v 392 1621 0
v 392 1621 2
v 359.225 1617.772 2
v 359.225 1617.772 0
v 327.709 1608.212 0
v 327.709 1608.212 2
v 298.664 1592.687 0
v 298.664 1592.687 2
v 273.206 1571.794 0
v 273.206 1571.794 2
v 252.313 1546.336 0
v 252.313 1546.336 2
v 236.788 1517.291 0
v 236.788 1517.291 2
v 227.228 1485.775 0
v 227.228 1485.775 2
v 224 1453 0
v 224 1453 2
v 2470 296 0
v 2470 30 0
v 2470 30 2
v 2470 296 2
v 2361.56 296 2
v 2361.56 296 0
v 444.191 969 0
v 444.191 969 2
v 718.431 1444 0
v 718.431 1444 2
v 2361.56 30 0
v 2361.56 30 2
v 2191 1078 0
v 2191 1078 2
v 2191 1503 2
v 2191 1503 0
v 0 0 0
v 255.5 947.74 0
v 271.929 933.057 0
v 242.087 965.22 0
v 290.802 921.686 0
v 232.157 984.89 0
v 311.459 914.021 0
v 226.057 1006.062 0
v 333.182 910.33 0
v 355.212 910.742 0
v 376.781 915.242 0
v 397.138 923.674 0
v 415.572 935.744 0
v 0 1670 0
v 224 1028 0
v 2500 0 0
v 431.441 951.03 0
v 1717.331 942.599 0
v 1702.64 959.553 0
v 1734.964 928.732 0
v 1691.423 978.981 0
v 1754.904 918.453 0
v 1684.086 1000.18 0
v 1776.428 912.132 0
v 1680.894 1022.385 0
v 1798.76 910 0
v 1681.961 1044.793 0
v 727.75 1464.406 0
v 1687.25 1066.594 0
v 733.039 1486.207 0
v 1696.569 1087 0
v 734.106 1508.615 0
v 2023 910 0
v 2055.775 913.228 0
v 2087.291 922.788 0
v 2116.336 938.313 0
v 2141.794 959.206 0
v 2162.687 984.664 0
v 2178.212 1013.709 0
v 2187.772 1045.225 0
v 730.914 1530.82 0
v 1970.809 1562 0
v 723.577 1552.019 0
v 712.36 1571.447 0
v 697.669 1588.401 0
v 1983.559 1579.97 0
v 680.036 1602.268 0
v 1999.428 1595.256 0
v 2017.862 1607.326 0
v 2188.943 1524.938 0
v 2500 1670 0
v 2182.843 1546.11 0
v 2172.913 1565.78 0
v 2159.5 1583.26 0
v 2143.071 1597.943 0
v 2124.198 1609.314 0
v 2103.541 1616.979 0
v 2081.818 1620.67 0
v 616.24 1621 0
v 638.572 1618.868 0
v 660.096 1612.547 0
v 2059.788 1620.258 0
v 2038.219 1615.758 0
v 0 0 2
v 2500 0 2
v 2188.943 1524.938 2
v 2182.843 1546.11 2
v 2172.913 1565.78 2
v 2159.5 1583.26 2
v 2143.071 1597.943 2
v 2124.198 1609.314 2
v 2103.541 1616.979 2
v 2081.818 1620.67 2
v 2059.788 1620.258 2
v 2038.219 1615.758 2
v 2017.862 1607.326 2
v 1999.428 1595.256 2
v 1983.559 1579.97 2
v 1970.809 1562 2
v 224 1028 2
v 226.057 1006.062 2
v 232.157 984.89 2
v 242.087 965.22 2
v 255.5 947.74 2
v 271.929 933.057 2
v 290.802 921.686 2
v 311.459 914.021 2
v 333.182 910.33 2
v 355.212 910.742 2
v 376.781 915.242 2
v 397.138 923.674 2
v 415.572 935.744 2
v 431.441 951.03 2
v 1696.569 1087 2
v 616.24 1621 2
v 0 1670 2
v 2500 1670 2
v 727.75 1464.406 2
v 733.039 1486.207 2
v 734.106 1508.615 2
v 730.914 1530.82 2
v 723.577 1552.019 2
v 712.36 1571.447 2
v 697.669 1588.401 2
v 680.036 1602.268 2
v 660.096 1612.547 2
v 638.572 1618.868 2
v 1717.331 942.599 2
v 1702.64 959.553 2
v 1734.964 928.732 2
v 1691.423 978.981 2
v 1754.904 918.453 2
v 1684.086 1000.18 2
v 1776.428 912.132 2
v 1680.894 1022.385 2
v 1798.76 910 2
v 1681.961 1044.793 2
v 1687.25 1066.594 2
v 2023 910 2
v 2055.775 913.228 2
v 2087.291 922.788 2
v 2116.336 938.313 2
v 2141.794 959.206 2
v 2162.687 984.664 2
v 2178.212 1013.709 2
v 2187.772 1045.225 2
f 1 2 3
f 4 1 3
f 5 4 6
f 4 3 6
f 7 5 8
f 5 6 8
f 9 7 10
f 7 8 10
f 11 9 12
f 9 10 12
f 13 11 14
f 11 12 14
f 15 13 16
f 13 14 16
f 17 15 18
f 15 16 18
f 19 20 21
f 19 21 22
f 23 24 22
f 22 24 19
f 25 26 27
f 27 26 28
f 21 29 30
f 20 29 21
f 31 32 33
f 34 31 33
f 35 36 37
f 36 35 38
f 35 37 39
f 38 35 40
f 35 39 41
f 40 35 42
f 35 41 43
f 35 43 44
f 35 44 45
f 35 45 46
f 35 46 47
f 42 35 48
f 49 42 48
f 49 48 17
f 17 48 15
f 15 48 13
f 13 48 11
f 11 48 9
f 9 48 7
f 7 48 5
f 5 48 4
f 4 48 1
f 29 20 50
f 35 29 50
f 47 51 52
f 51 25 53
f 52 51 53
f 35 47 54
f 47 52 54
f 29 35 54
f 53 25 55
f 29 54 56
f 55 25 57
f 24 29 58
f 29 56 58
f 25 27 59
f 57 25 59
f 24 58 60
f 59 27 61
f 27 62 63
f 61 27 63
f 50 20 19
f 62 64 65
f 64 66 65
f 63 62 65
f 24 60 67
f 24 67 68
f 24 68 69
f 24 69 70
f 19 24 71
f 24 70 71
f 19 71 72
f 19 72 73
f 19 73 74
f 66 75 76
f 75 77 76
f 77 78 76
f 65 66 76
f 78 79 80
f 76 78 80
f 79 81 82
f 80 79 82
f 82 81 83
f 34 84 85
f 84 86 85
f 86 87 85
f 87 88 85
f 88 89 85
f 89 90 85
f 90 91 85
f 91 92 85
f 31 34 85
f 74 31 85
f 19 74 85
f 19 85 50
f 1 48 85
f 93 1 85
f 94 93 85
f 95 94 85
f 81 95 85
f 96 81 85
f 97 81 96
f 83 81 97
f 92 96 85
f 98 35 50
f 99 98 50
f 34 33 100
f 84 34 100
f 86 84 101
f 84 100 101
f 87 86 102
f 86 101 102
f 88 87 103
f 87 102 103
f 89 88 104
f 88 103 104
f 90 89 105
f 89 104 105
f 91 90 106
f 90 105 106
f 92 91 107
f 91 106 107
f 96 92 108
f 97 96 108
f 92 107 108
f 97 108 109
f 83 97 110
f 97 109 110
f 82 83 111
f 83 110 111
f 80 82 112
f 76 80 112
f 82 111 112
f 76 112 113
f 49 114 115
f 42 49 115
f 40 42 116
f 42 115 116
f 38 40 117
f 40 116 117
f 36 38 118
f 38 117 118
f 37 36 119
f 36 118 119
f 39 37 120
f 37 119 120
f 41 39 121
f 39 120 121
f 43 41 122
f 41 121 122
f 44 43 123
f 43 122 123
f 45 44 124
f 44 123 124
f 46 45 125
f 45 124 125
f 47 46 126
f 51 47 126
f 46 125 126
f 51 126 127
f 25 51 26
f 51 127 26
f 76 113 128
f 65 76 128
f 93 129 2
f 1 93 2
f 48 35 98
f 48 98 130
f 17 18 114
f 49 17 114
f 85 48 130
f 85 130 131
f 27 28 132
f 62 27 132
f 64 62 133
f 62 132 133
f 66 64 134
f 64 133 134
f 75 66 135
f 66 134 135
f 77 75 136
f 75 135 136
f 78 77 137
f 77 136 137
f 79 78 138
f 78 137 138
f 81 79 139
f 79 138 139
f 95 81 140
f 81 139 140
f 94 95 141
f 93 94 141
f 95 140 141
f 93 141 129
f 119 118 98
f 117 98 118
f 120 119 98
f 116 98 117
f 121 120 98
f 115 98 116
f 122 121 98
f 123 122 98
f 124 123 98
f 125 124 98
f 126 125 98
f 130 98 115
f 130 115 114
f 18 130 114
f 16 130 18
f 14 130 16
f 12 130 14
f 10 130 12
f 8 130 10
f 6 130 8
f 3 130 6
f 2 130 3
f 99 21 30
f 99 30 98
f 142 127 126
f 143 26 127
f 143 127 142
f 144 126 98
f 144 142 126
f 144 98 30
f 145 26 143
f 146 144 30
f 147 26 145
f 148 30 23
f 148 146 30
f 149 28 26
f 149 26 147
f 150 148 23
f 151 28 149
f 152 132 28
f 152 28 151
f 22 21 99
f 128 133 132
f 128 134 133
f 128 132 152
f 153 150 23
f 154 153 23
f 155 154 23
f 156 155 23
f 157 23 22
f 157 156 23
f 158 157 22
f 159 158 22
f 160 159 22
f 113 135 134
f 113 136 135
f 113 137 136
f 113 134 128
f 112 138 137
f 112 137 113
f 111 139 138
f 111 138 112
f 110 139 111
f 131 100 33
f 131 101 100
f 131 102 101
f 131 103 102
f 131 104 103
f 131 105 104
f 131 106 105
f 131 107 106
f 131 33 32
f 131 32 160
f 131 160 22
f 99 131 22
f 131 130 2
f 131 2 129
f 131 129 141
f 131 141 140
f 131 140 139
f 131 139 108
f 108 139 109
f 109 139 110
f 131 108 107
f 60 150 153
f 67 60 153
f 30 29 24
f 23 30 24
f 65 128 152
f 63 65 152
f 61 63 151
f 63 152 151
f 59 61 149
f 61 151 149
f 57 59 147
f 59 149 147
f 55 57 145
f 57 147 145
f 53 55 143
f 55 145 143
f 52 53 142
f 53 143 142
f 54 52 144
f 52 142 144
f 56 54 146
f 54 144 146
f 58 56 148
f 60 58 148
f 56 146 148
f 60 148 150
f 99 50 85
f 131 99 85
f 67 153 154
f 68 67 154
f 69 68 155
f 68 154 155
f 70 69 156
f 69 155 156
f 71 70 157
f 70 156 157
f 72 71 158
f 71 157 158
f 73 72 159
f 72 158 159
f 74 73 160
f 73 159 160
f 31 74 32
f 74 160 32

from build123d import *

# Parameters (mm, degrees)
SKETCH1_W           = 2500
SKETCH1_H           = 1670
SKETCH1_W_2         = 108.44
SKETCH1_H_2         = 266
BOSS_EXTRUDE1_DEPTH = 2
CUT_EXTRUDE1_DEPTH  = 2994.515882891


with BuildPart() as part:
    # Sketch1 → Boss-Extrude1 (new body)
    with BuildSketch(Plane.XY):
        with Locations((1250, 835)):
            Rectangle(SKETCH1_W, SKETCH1_H)
        with Locations((2415.78, 163)):
            Rectangle(SKETCH1_W_2, SKETCH1_H_2, mode=Mode.SUBTRACT)
    extrude(amount=BOSS_EXTRUDE1_DEPTH)

    # Sketch2 → Cut-Extrude1 (cut, through all)
    with BuildSketch(Plane(origin=(471.963517843, -531.616762327, 33), x_dir=(1, 0, 0), z_dir=(0, 0, 1))):
        with BuildLine():
            Line((1498.845356152, 2093.616540003), (1224.605356152, 1618.616540003))
            ThreePointArc((1224.605356152, 1618.616540003), (1224.605548691, 1500.616651165), (1326.796482157, 1441.616762327))
            Line((1326.796482157, 1441.616762327), (1551.036482157, 1441.616762327))
            ThreePointArc((1551.036482157, 1441.616762327), (1669.830421397, 1490.822823088), (1719.036482157, 1609.616762327))
            Line((1719.036482157, 1609.616762327), (1719.036482157, 2034.616762327))
            ThreePointArc((1719.036482157, 2034.616762327), (1631.577005494, 2148.596043051), (1498.845356152, 2093.616540003))
        make_face()
        with BuildLine():
            Line((-247.963517843, 1984.616762327), (-247.963517843, 1559.616762327))
            ThreePointArc((-247.963517843, 1559.616762327), (-160.504041179, 1445.637481603), (-27.772391837, 1500.616984652))
            Line((-27.772391837, 1500.616984652), (246.467608163, 1975.616984652))
            ThreePointArc((246.467608163, 1975.616984652), (246.467415624, 2093.61687349), (144.276482157, 2152.616762327))
            Line((144.276482157, 2152.616762327), (-79.963517843, 2152.616762327))
            ThreePointArc((-79.963517843, 2152.616762327), (-198.757457082, 2103.410701567), (-247.963517843, 1984.616762327))
        make_face()
    extrude(amount=-CUT_EXTRUDE1_DEPTH, mode=Mode.SUBTRACT)


solid = part.part
